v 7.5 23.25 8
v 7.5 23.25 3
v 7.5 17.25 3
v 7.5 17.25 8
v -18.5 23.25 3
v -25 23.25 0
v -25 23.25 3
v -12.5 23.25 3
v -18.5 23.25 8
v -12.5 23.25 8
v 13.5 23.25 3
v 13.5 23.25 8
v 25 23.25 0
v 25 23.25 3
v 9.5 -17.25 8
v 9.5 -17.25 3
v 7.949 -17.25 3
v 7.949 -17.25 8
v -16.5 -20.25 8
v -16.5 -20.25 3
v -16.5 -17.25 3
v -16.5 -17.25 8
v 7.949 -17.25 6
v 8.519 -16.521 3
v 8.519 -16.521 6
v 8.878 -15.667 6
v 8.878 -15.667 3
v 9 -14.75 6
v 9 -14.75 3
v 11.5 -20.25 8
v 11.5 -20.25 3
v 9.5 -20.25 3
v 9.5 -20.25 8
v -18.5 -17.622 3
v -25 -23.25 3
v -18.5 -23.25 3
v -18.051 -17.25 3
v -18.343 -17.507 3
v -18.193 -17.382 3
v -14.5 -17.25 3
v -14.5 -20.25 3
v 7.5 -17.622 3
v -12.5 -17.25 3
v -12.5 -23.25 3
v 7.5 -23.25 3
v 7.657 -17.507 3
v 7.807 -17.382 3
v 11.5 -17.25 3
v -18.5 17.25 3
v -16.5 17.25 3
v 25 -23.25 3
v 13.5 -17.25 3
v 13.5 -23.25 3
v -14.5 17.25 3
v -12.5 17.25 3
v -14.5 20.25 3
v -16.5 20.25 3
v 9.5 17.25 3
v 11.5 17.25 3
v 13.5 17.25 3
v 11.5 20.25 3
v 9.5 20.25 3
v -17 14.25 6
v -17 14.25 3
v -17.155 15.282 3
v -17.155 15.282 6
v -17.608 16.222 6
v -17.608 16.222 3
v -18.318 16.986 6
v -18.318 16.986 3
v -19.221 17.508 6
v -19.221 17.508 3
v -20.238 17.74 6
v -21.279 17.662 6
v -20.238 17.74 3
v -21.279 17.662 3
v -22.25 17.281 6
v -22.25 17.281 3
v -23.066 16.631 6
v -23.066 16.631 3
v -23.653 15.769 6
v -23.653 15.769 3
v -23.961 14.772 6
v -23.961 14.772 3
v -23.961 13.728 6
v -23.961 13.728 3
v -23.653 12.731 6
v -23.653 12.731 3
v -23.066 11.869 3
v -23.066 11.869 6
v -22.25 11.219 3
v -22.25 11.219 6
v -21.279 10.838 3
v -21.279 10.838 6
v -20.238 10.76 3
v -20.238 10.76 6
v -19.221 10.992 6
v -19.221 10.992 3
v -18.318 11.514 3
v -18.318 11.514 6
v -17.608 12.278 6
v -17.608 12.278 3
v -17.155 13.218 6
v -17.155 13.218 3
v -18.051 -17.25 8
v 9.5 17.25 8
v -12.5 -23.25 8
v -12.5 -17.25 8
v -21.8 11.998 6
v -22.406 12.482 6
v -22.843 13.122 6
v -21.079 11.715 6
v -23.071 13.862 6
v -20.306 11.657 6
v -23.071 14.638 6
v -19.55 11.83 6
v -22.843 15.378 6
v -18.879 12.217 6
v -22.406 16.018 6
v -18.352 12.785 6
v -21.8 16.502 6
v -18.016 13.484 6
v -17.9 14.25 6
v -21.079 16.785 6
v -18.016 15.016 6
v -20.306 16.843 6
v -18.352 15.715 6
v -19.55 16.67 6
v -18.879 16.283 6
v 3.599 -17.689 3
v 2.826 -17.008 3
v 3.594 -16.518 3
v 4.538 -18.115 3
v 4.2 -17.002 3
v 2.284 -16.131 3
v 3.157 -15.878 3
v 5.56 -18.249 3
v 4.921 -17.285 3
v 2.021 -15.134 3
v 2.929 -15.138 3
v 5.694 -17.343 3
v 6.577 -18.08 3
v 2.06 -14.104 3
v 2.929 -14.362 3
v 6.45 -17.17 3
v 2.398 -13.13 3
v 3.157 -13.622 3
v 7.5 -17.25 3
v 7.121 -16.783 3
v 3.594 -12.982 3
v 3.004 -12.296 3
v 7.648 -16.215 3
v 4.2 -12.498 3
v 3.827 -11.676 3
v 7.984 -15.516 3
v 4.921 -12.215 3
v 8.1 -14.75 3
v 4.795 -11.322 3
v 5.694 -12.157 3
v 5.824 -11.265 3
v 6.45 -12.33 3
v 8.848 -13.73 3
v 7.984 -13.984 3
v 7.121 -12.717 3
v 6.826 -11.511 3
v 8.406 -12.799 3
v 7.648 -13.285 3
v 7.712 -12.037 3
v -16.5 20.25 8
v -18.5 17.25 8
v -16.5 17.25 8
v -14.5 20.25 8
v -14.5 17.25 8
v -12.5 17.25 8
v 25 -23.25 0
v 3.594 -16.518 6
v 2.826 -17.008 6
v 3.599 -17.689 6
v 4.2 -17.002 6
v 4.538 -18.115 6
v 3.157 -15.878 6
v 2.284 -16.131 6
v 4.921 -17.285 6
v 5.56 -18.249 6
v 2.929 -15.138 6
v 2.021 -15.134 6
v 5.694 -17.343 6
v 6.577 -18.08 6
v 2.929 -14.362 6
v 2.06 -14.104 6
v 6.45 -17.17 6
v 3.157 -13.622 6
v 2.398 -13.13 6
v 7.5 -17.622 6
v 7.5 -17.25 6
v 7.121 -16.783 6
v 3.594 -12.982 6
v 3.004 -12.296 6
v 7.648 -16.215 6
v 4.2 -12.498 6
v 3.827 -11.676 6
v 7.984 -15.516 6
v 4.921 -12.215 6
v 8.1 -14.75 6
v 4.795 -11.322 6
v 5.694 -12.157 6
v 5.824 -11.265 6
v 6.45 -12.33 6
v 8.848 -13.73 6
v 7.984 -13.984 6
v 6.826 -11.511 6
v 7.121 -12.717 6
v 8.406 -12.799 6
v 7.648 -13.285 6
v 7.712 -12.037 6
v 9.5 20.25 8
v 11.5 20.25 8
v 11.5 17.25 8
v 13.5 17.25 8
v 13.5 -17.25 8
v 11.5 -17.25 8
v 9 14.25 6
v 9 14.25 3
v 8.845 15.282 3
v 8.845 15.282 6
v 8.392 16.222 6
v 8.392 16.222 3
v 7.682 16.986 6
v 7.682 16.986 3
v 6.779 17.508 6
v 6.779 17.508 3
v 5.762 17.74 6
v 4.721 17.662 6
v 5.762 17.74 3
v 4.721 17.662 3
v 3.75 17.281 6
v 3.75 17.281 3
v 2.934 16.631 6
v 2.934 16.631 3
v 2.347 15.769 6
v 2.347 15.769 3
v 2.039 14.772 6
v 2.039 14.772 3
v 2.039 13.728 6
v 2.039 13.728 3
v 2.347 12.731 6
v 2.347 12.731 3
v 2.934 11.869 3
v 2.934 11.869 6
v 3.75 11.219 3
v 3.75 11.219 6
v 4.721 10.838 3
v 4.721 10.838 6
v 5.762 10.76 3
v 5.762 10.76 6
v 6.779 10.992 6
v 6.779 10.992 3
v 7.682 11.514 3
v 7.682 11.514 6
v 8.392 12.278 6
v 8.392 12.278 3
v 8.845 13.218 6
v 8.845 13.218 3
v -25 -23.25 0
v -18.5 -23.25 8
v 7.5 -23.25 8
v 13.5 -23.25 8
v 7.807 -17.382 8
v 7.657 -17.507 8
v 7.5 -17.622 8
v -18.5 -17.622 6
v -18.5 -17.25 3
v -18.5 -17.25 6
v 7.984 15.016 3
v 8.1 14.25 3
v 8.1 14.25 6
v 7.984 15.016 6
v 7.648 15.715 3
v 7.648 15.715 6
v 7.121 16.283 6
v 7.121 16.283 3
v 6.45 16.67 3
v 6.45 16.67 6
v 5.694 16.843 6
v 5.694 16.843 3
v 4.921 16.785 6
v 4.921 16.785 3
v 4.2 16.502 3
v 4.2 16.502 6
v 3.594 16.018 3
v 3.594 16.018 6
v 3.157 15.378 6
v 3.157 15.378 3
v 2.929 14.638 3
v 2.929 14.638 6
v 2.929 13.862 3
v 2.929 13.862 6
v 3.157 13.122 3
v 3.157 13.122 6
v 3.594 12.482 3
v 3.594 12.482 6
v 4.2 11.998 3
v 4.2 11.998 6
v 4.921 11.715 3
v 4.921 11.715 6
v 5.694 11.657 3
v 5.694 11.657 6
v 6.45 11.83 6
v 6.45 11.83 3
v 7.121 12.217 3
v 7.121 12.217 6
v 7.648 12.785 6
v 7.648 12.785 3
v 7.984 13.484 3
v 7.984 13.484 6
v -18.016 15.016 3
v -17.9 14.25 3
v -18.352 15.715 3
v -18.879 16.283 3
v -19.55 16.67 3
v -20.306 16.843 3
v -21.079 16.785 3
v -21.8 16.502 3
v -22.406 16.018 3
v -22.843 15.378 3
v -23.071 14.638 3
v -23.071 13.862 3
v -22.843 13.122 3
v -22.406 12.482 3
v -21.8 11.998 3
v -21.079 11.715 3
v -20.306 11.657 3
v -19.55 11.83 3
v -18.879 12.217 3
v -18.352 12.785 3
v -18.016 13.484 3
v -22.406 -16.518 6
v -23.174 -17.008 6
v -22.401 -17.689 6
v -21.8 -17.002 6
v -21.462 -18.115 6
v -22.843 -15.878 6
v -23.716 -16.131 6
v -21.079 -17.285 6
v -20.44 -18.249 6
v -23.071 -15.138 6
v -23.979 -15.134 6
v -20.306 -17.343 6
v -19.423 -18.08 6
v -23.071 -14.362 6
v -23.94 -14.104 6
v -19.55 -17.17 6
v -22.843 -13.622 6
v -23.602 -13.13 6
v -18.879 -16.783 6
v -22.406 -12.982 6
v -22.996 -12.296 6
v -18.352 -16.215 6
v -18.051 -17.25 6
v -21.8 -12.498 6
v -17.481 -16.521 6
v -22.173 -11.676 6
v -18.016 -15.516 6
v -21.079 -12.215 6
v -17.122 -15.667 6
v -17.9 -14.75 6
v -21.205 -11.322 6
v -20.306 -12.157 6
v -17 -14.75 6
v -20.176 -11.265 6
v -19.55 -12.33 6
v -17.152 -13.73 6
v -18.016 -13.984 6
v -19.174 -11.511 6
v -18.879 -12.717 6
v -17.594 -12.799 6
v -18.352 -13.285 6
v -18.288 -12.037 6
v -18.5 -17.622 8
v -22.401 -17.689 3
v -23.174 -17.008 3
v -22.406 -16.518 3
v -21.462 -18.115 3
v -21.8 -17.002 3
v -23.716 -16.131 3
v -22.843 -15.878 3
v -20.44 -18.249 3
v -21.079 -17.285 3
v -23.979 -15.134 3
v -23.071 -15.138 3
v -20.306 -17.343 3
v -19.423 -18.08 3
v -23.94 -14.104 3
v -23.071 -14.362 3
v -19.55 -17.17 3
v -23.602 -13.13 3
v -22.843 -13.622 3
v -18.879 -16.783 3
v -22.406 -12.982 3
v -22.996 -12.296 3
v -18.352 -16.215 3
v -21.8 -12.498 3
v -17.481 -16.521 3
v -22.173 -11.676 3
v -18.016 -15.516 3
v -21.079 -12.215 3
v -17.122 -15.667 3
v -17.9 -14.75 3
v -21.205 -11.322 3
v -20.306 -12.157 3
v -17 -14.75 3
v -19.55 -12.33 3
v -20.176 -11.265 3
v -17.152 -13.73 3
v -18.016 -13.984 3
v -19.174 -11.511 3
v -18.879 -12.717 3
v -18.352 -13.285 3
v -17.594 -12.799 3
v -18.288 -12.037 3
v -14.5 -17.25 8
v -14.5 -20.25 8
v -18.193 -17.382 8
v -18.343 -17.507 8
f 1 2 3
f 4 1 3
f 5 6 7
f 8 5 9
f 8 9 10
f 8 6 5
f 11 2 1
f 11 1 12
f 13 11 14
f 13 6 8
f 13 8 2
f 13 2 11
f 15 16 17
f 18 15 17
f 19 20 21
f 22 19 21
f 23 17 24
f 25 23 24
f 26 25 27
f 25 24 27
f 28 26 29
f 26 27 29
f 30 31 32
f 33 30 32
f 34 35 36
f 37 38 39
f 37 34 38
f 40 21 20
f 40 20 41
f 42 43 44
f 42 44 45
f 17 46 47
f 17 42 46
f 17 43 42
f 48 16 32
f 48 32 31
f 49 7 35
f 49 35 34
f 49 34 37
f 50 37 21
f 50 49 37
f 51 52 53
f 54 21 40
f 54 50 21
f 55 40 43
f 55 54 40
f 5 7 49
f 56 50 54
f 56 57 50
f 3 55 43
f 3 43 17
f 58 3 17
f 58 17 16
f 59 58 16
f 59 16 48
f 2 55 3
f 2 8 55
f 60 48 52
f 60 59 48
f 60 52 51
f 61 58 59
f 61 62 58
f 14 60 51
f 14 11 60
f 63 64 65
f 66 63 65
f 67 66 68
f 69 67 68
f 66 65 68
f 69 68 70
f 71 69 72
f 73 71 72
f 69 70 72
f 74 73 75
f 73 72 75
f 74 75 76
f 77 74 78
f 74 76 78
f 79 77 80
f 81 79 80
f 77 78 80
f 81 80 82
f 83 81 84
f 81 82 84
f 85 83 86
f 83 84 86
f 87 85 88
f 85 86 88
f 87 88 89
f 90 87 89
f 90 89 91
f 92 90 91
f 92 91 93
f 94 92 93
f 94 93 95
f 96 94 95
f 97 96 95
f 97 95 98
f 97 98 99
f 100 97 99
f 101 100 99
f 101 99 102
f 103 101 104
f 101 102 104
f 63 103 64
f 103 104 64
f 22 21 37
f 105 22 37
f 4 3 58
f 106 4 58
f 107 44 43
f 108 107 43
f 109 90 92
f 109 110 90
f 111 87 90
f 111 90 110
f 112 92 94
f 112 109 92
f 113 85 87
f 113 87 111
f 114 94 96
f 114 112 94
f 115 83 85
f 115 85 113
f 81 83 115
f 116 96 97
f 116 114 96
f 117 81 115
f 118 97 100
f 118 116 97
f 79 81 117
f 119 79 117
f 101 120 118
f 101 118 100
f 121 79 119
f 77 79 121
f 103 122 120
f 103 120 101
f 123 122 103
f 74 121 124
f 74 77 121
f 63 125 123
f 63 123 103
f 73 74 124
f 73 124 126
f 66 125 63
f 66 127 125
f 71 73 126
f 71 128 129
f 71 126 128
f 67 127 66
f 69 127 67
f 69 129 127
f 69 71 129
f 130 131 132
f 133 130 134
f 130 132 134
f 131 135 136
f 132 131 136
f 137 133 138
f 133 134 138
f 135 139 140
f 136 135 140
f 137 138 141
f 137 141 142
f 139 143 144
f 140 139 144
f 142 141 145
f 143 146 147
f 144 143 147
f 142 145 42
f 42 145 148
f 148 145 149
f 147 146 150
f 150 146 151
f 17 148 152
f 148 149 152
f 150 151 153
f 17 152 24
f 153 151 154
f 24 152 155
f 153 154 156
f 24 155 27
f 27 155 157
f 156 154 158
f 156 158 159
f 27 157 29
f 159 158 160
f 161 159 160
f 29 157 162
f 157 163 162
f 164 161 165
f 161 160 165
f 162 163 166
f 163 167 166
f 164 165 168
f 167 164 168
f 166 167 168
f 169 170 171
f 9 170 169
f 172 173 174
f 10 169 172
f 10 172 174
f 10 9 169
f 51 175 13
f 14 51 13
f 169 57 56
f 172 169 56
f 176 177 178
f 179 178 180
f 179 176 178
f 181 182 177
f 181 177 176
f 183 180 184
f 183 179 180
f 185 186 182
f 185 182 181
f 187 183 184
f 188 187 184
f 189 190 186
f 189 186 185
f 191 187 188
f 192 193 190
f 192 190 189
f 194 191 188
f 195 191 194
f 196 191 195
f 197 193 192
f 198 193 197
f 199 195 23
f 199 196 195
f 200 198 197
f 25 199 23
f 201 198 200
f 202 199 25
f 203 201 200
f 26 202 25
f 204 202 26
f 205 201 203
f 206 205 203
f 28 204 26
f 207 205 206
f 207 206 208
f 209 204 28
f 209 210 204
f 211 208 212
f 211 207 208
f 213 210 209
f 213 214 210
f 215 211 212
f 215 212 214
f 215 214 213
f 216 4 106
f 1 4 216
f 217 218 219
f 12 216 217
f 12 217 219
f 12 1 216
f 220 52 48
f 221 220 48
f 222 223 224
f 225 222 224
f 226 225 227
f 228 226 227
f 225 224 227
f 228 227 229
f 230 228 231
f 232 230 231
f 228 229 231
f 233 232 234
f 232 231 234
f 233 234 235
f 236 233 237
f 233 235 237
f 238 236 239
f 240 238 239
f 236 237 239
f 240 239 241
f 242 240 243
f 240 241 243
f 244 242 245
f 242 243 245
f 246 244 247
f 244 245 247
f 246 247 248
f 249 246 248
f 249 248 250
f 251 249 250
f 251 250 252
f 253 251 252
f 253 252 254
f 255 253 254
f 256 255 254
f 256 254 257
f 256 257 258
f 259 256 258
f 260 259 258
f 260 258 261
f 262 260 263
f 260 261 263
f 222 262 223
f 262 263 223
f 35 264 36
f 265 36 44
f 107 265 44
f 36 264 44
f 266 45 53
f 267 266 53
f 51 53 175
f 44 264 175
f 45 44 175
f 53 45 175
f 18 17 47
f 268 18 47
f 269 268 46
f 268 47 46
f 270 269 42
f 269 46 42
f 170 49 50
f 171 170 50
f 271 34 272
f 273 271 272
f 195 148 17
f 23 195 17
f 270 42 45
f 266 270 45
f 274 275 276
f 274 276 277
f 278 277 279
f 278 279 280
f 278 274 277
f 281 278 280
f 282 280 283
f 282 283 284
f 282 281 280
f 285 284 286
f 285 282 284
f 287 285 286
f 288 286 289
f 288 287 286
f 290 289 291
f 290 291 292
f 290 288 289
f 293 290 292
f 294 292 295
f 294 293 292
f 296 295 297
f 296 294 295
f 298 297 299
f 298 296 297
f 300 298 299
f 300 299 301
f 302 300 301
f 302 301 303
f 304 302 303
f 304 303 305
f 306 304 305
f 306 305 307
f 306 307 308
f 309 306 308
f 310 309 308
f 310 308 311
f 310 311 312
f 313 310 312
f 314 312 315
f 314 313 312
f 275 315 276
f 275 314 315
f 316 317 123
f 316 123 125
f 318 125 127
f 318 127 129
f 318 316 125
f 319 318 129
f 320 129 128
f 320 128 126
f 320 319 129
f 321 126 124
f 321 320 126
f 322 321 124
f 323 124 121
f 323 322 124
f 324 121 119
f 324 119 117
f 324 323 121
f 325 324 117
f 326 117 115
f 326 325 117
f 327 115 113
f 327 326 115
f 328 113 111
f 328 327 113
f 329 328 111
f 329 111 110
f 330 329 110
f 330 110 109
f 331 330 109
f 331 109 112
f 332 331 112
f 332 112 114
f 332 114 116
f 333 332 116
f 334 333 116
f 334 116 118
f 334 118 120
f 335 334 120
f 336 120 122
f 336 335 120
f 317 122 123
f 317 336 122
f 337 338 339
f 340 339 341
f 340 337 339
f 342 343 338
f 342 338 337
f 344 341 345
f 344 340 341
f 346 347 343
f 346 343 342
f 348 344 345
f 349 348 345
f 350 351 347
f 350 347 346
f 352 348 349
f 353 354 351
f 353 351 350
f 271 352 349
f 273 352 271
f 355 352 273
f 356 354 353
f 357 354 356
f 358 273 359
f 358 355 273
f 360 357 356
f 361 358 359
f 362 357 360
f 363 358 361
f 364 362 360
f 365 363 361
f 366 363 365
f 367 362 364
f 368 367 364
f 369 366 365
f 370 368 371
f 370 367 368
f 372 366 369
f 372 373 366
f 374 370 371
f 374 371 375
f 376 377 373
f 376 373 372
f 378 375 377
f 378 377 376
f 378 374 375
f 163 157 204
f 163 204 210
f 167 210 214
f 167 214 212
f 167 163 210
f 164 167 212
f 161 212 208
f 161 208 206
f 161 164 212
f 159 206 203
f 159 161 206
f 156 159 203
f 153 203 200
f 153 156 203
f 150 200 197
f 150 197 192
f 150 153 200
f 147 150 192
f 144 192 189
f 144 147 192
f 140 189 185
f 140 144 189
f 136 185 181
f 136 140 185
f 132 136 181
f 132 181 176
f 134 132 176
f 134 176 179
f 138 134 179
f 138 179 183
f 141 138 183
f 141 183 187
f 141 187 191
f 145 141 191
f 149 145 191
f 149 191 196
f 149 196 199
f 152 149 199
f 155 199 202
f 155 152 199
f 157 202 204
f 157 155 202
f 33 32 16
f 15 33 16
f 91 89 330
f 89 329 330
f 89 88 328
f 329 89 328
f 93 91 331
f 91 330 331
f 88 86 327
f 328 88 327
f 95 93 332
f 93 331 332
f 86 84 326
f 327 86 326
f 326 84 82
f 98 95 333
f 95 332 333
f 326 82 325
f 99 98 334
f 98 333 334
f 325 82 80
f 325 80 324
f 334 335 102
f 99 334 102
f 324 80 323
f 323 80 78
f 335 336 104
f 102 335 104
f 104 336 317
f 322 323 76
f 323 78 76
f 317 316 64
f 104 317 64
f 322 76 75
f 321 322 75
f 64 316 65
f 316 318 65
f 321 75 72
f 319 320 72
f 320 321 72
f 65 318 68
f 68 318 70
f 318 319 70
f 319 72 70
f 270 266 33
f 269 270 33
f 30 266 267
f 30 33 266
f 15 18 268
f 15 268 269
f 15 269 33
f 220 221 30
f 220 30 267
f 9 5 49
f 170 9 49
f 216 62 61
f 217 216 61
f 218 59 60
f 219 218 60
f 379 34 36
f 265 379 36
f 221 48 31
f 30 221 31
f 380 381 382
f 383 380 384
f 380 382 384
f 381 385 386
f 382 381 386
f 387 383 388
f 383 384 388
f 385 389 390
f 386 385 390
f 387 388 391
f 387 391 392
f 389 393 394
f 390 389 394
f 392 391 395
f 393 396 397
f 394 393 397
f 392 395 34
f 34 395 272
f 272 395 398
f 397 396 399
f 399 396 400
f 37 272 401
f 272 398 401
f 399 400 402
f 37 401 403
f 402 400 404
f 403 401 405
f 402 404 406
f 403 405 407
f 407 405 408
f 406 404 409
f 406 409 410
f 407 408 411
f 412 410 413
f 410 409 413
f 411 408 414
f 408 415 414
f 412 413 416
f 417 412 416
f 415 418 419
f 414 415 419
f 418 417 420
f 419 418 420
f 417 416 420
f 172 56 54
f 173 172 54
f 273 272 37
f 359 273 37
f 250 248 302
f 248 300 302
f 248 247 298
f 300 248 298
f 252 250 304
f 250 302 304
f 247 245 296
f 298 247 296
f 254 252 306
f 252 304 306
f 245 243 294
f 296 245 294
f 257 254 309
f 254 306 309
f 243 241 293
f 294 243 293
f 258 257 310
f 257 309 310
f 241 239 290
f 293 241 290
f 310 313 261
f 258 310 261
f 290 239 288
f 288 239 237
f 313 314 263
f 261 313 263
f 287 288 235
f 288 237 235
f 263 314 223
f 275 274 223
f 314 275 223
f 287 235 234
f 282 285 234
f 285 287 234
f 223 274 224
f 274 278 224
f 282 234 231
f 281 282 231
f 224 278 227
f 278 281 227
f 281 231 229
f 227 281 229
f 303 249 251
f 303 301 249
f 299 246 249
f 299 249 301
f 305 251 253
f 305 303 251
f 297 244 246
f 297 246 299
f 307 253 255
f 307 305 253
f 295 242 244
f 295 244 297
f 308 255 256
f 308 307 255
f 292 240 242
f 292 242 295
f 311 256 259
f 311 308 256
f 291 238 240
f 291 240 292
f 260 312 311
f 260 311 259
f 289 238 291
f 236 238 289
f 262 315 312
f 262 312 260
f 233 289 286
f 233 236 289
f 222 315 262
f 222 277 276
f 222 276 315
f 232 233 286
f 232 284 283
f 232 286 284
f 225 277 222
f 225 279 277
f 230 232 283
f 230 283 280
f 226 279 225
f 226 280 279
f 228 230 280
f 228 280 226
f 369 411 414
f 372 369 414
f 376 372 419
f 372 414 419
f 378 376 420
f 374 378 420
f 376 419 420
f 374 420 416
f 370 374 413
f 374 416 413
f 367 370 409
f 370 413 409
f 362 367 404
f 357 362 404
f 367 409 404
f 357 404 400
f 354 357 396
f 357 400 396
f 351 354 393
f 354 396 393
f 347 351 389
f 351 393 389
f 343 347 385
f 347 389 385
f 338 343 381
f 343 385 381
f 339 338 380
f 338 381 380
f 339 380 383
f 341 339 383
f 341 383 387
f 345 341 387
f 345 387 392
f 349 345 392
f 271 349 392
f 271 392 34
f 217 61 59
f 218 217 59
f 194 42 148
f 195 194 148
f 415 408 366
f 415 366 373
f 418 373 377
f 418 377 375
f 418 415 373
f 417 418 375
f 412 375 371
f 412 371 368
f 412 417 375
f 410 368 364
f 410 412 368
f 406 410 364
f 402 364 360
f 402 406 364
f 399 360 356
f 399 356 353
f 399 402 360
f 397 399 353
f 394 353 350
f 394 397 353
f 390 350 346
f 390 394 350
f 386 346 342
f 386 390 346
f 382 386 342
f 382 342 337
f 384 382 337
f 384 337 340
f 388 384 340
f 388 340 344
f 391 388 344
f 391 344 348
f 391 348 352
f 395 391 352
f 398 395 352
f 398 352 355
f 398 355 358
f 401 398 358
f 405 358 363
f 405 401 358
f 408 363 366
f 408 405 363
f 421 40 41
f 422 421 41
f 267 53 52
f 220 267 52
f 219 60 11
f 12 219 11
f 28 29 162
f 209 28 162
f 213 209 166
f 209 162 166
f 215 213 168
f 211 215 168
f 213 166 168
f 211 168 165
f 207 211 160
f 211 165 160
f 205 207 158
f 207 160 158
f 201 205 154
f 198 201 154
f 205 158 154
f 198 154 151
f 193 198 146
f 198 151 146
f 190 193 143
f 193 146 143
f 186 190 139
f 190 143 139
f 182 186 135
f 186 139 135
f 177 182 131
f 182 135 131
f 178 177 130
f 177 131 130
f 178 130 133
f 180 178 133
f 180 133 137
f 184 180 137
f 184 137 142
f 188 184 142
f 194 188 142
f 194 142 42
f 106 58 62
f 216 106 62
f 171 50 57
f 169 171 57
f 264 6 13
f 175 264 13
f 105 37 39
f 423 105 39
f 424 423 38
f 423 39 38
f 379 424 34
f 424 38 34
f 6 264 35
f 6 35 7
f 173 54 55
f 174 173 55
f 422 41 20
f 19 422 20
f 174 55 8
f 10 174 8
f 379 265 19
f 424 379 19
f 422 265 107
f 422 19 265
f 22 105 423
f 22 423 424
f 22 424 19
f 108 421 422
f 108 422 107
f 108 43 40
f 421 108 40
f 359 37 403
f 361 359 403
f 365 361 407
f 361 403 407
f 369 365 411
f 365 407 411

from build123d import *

# Parameters (mm, degrees)
F0_W     = 50
F0_H     = 46.5
F1_DEPTH = 3
F3_DEPTH = 5
F2_R     = 3.5
F2_R_2   = 2.6
F4_DEPTH = 3


with BuildPart() as f1:
    # F0 (on Top) → F1 (new body)
    with BuildSketch(Plane.XY):
        Rectangle(F0_W, F0_H)
    extrude(amount=F1_DEPTH)

    # F2 (on face) → F3 (join)
    with BuildSketch(Plane.XY.offset(3)):
        Polygon((-12.5, 23.25), (-18.5, 23.25), (-18.5, 17.25), (-16.5, 17.25), (-16.5, 20.25), (-14.5, 20.25), (-14.5, 17.25), (-12.5, 17.25), align=None)
        Polygon((13.5, 23.25), (7.5, 23.25), (7.5, 17.25), (9.5, 17.25), (9.5, 20.25), (11.5, 20.25), (11.5, 17.25), (13.5, 17.25), align=None)
        with BuildLine():
            Line((9.5, -20.25), (9.5, -17.25))
            Line((9.5, -17.25), (7.94949, -17.25))
            ThreePointArc((7.94949, -17.25), (7.732518, -17.445526), (7.5, -17.622281))
            Line((7.5, -17.622281), (7.5, -23.25))
            Line((7.5, -23.25), (13.5, -23.25))
            Line((13.5, -23.25), (13.5, -17.25))
            Line((13.5, -17.25), (11.5, -17.25))
            Line((11.5, -17.25), (11.5, -20.25))
            Line((11.5, -20.25), (9.5, -20.25))
        make_face()
        with BuildLine():
            Line((-16.5, -20.25), (-16.5, -17.25))
            Line((-16.5, -17.25), (-18.05051, -17.25))
            ThreePointArc((-18.05051, -17.25), (-18.267482, -17.445526), (-18.5, -17.622281))
            Line((-18.5, -17.622281), (-18.5, -23.25))
            Line((-18.5, -23.25), (-12.5, -23.25))
            Line((-12.5, -23.25), (-12.5, -17.25))
            Line((-12.5, -17.25), (-14.5, -17.25))
            Line((-14.5, -17.25), (-14.5, -20.25))
            Line((-14.5, -20.25), (-16.5, -20.25))
        make_face()
    extrude(amount=F3_DEPTH)


with BuildPart() as f4:
    # F2 (on face) → F4 (new body)
    with BuildSketch(Plane.XY.offset(3)):
        with Locations((-20.5, 14.25)):
            Circle(F2_R)
        with Locations((-20.5, 14.25)):
            Circle(F2_R_2, mode=Mode.SUBTRACT)
        with Locations((5.5, 14.25)):
            Circle(F2_R)
        with Locations((5.5, 14.25)):
            Circle(F2_R_2, mode=Mode.SUBTRACT)
        with BuildLine():
            Line((7.5, -17.25), (7.94949, -17.25))
            ThreePointArc((7.94949, -17.25), (8.726702, -16.105874), (9, -14.75))
            ThreePointArc((9, -14.75), (2.397582, -13.129815), (7.5, -17.622281))
            Line((7.5, -17.622281), (7.5, -17.25))
        make_face()
        with Locations((5.5, -14.75)):
            Circle(F2_R_2, mode=Mode.SUBTRACT)
        with BuildLine():
            Line((-18.5, -17.25), (-18.05051, -17.25))
            ThreePointArc((-18.05051, -17.25), (-17.273298, -16.105874), (-17, -14.75))
            ThreePointArc((-17, -14.75), (-23.602418, -13.129815), (-18.5, -17.622281))
            Line((-18.5, -17.622281), (-18.5, -17.25))
        make_face()
        with Locations((-20.5, -14.75)):
            Circle(F2_R_2, mode=Mode.SUBTRACT)
    extrude(amount=F4_DEPTH)


solid = Compound([f1.part, f4.part])
